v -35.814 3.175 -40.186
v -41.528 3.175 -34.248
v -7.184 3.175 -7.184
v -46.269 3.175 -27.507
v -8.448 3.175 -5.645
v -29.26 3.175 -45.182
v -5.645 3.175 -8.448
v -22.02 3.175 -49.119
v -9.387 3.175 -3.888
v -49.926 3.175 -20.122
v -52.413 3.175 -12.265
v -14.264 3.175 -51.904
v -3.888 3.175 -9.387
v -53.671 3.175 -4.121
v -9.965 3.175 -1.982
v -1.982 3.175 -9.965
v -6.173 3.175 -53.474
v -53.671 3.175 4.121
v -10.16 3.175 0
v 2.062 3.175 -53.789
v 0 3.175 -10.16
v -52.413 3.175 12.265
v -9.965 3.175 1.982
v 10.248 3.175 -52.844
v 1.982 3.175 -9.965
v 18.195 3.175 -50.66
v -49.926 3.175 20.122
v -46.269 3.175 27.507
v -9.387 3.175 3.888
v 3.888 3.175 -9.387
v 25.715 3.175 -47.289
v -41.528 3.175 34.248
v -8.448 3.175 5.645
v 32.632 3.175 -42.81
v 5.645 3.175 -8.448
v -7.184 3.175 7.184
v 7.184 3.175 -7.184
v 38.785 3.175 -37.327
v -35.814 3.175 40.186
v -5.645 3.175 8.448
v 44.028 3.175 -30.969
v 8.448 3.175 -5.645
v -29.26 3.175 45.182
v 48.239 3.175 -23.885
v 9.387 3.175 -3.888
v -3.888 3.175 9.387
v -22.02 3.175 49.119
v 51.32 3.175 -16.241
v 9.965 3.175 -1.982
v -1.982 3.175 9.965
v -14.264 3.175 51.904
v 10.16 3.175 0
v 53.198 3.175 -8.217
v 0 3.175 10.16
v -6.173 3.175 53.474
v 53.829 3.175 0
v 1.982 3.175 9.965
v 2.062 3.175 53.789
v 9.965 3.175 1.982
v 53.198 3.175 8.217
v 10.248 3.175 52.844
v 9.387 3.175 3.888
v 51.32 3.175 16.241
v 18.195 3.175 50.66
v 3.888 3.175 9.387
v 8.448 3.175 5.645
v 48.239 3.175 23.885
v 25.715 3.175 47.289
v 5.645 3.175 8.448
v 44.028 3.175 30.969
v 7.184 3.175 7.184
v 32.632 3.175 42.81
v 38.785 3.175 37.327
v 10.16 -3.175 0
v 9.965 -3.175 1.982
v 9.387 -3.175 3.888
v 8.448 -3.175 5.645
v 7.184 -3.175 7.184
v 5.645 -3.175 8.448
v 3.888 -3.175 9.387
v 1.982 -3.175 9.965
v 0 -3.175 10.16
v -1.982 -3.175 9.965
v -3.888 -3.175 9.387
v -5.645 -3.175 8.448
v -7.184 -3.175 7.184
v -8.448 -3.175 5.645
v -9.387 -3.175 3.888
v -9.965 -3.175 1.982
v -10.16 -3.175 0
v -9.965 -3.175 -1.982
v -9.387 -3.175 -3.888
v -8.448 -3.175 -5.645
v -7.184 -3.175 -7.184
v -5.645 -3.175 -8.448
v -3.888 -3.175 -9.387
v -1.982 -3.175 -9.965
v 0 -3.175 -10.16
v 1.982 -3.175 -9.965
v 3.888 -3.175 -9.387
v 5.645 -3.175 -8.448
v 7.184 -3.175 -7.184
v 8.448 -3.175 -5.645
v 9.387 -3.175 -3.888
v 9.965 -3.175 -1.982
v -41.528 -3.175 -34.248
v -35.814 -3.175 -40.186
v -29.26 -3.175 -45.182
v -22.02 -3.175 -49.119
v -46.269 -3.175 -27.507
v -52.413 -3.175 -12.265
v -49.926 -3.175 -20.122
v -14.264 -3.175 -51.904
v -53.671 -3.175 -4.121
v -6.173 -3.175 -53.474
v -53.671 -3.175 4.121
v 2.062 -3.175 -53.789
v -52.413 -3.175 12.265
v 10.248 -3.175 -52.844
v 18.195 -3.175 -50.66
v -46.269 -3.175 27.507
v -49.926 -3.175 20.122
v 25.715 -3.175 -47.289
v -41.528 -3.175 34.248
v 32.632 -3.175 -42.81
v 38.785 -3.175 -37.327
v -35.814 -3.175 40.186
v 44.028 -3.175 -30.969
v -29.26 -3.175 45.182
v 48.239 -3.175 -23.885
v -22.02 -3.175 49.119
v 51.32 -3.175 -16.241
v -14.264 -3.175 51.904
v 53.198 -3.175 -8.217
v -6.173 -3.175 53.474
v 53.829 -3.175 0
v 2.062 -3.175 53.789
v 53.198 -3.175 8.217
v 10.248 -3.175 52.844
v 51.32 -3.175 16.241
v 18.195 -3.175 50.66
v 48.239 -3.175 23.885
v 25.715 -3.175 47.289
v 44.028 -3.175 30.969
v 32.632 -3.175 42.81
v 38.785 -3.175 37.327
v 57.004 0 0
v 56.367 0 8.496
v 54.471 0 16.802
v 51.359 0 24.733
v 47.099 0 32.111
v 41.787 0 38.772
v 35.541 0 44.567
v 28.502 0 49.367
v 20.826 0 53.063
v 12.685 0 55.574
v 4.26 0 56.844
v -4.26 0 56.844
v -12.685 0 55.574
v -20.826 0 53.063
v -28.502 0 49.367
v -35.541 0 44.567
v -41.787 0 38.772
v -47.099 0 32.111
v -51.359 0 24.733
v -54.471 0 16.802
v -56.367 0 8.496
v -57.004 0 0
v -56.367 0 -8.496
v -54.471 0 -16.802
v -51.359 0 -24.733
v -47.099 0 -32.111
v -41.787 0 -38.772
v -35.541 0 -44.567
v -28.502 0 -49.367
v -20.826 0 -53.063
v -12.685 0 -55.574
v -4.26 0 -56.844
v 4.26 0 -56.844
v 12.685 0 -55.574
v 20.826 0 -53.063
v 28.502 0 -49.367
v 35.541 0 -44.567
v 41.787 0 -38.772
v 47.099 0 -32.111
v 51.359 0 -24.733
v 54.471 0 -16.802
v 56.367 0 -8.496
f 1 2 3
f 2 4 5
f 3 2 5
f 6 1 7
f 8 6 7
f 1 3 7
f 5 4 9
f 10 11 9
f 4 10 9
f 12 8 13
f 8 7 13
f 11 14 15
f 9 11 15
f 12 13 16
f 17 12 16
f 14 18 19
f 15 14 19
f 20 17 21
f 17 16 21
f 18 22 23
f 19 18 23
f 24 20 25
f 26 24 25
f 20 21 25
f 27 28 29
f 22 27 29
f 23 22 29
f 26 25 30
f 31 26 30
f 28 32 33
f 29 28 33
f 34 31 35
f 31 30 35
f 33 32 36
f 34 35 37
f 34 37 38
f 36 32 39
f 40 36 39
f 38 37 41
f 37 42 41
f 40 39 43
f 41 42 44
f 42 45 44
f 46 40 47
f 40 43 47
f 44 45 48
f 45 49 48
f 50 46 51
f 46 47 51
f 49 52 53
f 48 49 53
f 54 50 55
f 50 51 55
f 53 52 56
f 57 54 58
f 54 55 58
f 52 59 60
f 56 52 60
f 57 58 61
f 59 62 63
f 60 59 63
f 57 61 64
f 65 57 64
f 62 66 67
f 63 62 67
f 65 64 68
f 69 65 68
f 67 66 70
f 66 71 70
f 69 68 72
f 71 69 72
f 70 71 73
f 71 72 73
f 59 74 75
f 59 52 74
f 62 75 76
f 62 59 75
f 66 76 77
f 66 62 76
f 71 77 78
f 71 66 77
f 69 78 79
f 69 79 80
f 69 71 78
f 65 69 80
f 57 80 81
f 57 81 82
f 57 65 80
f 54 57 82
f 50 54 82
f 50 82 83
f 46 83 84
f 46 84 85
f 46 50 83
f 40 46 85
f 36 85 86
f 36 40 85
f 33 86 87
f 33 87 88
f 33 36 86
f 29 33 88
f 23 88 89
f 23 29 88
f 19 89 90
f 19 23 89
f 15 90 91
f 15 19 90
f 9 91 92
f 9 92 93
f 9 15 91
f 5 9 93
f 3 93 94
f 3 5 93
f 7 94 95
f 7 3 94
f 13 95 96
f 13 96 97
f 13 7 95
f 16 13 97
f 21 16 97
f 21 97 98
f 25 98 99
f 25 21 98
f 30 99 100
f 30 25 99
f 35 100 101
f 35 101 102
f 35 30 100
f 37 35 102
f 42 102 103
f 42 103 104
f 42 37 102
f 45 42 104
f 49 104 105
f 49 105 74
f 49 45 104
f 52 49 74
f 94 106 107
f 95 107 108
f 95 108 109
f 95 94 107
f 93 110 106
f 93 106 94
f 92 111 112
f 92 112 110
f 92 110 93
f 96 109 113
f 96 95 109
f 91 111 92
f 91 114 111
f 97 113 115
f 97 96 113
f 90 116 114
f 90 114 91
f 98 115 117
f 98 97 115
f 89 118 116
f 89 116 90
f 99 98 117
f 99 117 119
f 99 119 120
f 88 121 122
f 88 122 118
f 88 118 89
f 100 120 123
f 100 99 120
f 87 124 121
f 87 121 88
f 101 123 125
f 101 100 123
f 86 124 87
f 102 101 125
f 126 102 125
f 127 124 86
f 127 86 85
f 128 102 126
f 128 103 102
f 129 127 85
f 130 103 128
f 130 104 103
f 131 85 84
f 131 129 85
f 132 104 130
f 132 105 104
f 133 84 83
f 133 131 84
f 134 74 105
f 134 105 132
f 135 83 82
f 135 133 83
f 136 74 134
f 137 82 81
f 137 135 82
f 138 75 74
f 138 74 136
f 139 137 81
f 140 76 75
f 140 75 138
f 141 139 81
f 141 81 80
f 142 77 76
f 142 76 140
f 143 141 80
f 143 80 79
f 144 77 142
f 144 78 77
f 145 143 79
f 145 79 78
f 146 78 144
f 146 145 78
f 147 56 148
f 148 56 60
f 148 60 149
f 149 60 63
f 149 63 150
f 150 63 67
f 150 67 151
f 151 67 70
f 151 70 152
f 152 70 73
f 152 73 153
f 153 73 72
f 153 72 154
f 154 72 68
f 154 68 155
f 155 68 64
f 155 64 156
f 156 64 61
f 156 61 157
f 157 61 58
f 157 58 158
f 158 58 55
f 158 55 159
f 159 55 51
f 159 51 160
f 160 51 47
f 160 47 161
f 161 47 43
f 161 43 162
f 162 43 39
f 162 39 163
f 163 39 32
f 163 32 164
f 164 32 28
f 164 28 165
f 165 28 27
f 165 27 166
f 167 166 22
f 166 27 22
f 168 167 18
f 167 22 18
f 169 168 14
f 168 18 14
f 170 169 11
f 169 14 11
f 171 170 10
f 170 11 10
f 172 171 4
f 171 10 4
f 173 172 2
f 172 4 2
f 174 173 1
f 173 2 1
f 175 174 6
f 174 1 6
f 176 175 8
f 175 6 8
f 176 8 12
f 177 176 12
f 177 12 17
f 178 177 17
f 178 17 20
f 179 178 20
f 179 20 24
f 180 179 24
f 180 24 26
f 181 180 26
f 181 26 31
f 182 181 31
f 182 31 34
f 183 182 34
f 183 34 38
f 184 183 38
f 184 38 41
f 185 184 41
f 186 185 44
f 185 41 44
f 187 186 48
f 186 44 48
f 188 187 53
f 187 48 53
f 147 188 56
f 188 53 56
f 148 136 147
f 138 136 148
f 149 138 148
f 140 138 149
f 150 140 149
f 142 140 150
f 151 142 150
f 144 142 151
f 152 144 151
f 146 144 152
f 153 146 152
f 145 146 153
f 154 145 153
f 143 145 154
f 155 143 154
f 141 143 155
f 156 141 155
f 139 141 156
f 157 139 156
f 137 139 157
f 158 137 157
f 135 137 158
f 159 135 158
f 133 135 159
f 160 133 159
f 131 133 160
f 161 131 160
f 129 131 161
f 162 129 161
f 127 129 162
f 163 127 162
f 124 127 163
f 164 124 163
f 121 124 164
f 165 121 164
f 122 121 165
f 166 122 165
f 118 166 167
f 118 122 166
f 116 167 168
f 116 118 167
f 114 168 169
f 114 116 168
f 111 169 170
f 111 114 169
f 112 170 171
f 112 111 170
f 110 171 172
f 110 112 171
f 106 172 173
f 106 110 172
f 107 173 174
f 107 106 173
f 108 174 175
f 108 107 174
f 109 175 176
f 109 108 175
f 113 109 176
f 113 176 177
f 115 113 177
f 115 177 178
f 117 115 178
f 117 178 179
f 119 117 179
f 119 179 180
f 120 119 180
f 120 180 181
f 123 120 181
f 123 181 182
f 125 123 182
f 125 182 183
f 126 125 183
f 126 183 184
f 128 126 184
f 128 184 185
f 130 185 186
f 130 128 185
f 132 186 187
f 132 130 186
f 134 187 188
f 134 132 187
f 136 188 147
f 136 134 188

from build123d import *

# Parameters (mm, degrees)
F0_R     = 57.0036586855
F0_R_2   = 10.16
F1_DEPTH = 3.175
F2_SIZE  = 3.175
F3_SIZE  = 3.17499


# Not quite as in the source:
# - a fillet or chamfer is up to 0.001 mm smaller than in the source, because OpenCascade refuses the exact size


with BuildPart() as f1:
    # F0 (on Front) → F1 (new body, symmetric)
    with BuildSketch(Plane.XZ):
        Circle(F0_R)
        Circle(F0_R_2, mode=Mode.SUBTRACT)
    extrude(amount=F1_DEPTH, both=True)

    # F2
    f2_edges = [f1.edges().sort_by_distance(p)[0] for p in [
        (-57.003659, 3.175, 0),
    ]]
    chamfer(f2_edges, length=F2_SIZE)

    # F3 (size 3.175 in the source; OpenCascade refuses exactly that, so slightly less here)
    f3_edges = [f1.edges().sort_by_distance(p)[0] for p in [
        (-57.003659, -3.175, 0),
    ]]
    chamfer(f3_edges, length=F3_SIZE)


solid = f1.part
